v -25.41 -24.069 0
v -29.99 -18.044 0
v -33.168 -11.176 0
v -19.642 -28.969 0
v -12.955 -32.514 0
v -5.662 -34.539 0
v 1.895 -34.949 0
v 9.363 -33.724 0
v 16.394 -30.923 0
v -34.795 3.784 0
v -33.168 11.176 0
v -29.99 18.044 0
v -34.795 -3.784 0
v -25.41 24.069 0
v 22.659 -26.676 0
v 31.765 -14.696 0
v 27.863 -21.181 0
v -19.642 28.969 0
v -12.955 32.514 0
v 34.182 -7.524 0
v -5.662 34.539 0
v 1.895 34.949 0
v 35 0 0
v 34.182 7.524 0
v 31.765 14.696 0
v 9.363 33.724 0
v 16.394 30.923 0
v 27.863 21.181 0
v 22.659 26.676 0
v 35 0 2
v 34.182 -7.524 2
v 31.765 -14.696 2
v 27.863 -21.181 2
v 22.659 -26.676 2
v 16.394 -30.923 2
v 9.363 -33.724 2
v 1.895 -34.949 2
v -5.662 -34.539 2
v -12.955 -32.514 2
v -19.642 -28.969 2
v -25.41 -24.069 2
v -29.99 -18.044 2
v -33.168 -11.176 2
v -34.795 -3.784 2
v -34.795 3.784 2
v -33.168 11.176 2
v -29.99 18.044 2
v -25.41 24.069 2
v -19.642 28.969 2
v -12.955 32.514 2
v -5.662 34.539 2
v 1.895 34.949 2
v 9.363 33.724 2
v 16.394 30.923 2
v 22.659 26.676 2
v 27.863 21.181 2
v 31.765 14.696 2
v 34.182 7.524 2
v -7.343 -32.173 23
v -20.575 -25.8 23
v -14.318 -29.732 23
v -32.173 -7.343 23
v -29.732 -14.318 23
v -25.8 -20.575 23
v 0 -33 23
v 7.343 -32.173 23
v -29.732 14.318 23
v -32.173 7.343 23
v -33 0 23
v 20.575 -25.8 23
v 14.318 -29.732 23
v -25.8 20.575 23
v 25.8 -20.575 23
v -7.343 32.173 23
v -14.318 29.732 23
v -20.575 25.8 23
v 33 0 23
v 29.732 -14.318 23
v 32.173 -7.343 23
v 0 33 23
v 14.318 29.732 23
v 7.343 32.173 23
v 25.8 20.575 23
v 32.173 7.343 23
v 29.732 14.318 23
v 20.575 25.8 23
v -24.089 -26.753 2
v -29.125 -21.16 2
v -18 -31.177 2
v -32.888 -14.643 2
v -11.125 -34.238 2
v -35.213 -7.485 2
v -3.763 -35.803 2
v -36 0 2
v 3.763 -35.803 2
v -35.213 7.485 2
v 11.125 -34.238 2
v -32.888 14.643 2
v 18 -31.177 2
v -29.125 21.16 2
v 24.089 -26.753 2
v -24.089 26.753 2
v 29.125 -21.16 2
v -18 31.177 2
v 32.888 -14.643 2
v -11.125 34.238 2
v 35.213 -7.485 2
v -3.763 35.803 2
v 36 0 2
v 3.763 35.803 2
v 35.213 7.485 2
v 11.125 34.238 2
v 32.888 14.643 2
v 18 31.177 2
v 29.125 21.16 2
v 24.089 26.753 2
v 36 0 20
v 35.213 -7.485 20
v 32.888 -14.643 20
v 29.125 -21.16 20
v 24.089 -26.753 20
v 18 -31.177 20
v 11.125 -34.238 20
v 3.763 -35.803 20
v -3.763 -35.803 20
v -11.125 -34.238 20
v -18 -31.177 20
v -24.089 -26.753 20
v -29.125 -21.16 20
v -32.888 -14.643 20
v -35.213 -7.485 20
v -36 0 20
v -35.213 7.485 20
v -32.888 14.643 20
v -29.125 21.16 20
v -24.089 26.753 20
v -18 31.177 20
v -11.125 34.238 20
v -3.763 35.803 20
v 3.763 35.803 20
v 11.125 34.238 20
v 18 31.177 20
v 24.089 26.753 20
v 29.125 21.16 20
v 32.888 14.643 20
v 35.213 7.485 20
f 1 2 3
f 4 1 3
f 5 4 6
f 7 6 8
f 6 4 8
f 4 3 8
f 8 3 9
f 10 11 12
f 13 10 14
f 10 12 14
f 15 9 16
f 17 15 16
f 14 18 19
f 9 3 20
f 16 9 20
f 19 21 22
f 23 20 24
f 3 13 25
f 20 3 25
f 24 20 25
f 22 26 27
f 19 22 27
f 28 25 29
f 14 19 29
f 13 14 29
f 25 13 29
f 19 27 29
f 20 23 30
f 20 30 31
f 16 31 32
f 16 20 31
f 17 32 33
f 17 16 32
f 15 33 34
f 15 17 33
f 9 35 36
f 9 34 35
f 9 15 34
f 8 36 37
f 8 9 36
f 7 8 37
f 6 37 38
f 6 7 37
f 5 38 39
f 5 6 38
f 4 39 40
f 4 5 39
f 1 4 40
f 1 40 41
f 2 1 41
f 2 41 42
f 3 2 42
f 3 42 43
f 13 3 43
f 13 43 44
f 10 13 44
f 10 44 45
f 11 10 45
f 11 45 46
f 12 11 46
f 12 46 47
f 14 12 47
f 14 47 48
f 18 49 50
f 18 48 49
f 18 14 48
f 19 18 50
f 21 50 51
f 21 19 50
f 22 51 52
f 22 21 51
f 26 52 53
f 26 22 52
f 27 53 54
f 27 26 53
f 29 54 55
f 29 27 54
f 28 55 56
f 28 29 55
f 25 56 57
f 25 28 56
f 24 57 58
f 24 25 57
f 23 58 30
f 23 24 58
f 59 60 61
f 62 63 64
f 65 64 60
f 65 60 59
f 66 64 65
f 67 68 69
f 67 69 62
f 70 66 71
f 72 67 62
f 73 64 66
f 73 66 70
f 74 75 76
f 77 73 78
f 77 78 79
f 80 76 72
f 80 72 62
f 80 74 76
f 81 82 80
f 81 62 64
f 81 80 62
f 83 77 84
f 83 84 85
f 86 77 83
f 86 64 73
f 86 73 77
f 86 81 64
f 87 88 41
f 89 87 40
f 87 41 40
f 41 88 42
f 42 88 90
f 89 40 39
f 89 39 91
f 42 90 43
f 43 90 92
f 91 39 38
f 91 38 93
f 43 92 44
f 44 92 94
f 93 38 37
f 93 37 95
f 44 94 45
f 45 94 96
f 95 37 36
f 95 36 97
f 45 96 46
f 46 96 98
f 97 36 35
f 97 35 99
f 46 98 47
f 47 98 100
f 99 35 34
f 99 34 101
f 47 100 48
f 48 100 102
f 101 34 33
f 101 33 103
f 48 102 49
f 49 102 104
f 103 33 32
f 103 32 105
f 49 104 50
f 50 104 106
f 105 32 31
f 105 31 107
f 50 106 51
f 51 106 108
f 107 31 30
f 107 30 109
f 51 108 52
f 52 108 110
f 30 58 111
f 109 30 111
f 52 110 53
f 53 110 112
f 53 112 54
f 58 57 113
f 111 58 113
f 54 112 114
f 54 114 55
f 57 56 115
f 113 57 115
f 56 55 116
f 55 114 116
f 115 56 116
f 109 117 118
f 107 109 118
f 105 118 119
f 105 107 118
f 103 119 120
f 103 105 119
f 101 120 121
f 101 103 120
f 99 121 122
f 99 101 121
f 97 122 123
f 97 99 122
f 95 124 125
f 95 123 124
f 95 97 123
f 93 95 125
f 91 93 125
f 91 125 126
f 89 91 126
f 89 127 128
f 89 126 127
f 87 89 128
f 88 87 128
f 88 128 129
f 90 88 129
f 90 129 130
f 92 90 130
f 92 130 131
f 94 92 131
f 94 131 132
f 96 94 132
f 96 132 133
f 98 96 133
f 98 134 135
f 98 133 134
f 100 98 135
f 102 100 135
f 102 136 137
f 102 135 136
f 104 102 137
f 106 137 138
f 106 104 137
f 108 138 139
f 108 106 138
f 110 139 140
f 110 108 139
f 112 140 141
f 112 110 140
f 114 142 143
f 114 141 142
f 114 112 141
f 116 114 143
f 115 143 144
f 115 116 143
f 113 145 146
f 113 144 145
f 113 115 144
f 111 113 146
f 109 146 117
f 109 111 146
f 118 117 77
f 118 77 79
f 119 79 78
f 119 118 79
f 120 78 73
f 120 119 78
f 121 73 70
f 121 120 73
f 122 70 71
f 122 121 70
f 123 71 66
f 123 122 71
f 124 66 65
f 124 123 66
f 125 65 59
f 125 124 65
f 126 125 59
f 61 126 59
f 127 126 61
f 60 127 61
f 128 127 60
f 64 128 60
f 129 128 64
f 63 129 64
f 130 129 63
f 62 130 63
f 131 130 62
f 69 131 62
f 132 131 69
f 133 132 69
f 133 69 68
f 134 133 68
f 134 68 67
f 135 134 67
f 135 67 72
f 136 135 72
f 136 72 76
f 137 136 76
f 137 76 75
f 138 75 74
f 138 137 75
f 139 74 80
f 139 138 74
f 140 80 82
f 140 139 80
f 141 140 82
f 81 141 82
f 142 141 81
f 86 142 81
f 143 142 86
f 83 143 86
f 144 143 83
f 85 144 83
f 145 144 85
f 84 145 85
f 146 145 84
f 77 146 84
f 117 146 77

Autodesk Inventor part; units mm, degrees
ref_plane "YZ Plane" through (0, 0, 0) normal (1, 0, 0) x (0, 1, 0)
ref_plane "XZ Plane" through (0, 0, 0) normal (0, 1, 0) x (-1, 0, 0)
ref_plane "XY Plane" through (0, 0, 0) normal (0, 0, 1) x (1, 0, 0)
sketch "Sketch1" plane through (0, 0, 0) normal (0, 0, 1) x (1, 0, 0)
  circle A0 centre (0, 0) radius 35
  dimension "d0" = 70
extrude "Extrusion1" add sketch "Sketch1" along normal blind 2
sketch "Sketch2" plane through (0, 0, 2) normal (0, 0, 1) x (1, 0, 0)
  circle A0 centre (0, 0) radius 36
  dimension "d3" = 72
extrude "Extrusion2" add sketch "Sketch2" along normal blind 21
chamfer "Chamfer1" distance 3 angle 45 1 edges at (-36, 0, 23)
properties part number "LIdar_p2"
